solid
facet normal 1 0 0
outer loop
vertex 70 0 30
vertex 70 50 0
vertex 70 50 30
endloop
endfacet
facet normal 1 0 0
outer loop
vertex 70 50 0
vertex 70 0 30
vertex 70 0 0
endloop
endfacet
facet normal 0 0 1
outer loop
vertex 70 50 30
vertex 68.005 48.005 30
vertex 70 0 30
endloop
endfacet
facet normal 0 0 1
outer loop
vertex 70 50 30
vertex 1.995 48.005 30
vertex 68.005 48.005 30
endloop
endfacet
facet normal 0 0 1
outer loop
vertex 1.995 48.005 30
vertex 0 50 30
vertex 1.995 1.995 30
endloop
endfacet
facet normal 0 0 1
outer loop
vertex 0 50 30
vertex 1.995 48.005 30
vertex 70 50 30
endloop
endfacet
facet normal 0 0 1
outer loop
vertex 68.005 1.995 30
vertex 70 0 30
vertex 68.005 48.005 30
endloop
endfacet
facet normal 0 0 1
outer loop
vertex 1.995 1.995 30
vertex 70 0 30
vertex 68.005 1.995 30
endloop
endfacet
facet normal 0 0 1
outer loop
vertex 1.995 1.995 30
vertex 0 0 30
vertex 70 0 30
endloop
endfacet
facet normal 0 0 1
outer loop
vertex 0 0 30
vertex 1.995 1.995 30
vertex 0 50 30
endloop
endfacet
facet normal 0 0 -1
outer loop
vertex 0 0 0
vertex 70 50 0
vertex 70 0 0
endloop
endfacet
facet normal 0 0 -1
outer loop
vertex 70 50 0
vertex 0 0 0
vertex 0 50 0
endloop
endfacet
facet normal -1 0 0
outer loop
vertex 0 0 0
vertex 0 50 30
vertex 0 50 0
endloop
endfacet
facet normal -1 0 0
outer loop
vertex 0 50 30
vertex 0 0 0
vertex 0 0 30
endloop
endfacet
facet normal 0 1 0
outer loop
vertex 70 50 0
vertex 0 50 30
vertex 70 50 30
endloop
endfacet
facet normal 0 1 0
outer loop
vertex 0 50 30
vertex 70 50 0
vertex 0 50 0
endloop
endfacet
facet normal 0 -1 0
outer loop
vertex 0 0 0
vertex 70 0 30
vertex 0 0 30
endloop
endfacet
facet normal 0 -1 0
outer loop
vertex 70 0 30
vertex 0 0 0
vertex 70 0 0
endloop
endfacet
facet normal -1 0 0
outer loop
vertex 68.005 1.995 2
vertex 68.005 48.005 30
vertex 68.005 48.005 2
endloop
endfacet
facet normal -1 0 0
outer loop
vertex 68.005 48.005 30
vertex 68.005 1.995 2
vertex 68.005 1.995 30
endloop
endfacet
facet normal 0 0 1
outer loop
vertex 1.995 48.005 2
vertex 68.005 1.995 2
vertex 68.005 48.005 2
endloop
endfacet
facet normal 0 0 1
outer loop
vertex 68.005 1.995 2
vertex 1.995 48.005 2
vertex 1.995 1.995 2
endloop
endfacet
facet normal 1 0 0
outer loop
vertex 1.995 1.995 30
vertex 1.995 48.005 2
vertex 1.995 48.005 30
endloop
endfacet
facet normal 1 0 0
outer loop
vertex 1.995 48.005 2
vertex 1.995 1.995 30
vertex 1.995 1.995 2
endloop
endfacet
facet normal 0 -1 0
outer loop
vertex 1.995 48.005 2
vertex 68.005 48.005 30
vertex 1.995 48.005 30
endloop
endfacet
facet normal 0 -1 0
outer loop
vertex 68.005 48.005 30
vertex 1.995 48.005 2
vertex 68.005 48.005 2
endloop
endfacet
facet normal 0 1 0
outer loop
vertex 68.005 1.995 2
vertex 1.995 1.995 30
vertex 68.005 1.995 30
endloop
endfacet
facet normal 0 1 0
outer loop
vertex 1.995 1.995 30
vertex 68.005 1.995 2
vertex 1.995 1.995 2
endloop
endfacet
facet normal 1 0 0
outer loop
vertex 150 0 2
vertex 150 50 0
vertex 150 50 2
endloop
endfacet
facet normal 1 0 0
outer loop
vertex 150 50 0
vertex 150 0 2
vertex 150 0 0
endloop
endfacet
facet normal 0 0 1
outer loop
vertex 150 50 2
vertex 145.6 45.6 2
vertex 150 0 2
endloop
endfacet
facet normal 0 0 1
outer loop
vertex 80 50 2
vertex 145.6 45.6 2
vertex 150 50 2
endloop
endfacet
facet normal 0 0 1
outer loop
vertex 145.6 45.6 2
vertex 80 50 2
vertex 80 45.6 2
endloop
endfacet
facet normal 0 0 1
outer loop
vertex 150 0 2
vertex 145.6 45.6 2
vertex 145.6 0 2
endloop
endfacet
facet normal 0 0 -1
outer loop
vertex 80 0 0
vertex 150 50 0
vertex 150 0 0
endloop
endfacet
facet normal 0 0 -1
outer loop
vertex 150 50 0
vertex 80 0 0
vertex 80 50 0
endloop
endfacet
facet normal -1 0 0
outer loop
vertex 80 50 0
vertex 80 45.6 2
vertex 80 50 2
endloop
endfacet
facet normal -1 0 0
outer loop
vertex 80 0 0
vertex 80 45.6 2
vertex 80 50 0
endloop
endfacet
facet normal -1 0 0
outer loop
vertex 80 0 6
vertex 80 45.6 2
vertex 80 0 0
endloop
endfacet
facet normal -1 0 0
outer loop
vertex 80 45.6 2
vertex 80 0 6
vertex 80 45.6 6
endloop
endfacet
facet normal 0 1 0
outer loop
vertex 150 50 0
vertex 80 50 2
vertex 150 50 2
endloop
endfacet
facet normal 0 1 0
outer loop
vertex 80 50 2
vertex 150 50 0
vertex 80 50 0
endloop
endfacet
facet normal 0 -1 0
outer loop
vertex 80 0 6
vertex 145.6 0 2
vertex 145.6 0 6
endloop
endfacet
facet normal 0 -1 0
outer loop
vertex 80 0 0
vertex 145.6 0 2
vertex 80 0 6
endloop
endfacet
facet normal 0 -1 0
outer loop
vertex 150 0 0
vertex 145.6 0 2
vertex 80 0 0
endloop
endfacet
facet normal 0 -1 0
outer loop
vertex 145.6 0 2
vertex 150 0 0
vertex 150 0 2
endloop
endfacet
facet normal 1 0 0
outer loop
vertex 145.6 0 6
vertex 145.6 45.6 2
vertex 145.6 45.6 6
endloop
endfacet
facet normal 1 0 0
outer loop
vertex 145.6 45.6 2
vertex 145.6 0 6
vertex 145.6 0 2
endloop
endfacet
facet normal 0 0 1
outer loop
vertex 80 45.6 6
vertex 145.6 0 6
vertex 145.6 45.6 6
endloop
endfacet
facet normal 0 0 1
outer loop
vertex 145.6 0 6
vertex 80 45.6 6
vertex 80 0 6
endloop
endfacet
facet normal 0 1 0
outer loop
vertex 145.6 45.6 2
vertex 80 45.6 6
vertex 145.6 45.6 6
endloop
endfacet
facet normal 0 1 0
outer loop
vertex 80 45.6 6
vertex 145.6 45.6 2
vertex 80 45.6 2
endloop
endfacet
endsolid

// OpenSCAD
// Two-part enclosure for small electronics board (Arduino-based temp logger)
// Part 1: Box (Z=0 to 30)
// Part 2: Lid (Z=0 to 6)
// Both parts printed side-by-side on the bed (XY plane)

$fn = 64;

// Box Dimensions
box_outer_x = 70;
box_outer_y = 50;
box_outer_z = 30;
box_wall = 2;
box_floor = 2;

// Lid Dimensions
lid_plate_x = 70;
lid_plate_y = 50;
lid_plate_z = 2;
lip_outer_x = 65.6;
lip_outer_y = 45.6;
lip_thickness = 1.5;
lip_height = 4;
lip_clearance = 0.2; // 0.2mm clearance on each side relative to box inner

// Placement
gap_between_parts = 10;

// Calculate Inner Box Dimensions
box_inner_x = box_outer_x - (2 * box_wall);
box_inner_y = box_outer_y - (2 * box_wall);
box_inner_z = box_outer_z - box_floor;

// Calculate Lid Position (Centered on X, Y)
// Box Center: (0, 0)
// Box Right Edge: box_outer_x / 2 = 35
// Lid Left Edge: Box Right Edge + gap = 35 + 10 = 45
// Lid Center X: Lid Left Edge + lid_outer_x / 2 = 45 + 35 = 80
// Lid Center Y: 0
lid_center_x = (box_outer_x / 2) + gap_between_parts + (lid_plate_x / 2);
lid_center_y = 0;

// Box Module
module box() {
    difference() {
        cube([box_outer_x, box_outer_y, box_outer_z]);
        translate([
            (box_outer_x - (box_inner_x + 0.01)) / 2,
            (box_outer_y - (box_inner_y + 0.01)) / 2,
            box_floor
        ]) cube([box_inner_x + 0.01, box_inner_y + 0.01, box_inner_z + 0.01]);
    }
}

// Lid Module
module lid() {
    union() {
        cube([lid_plate_x, lid_plate_y, lid_plate_z]);
        translate([
            0,
            0,
            lid_plate_z
        ]) cube([lip_outer_x, lip_outer_y, lip_height]);
    }
}

// Main Assembly
// Box centered at (0,0)
// Lid centered at (lid_center_x, 0)
translate([0, 0, 0]) {
    box();
}

translate([lid_center_x, lid_center_y, 0]) {
    lid();
}
